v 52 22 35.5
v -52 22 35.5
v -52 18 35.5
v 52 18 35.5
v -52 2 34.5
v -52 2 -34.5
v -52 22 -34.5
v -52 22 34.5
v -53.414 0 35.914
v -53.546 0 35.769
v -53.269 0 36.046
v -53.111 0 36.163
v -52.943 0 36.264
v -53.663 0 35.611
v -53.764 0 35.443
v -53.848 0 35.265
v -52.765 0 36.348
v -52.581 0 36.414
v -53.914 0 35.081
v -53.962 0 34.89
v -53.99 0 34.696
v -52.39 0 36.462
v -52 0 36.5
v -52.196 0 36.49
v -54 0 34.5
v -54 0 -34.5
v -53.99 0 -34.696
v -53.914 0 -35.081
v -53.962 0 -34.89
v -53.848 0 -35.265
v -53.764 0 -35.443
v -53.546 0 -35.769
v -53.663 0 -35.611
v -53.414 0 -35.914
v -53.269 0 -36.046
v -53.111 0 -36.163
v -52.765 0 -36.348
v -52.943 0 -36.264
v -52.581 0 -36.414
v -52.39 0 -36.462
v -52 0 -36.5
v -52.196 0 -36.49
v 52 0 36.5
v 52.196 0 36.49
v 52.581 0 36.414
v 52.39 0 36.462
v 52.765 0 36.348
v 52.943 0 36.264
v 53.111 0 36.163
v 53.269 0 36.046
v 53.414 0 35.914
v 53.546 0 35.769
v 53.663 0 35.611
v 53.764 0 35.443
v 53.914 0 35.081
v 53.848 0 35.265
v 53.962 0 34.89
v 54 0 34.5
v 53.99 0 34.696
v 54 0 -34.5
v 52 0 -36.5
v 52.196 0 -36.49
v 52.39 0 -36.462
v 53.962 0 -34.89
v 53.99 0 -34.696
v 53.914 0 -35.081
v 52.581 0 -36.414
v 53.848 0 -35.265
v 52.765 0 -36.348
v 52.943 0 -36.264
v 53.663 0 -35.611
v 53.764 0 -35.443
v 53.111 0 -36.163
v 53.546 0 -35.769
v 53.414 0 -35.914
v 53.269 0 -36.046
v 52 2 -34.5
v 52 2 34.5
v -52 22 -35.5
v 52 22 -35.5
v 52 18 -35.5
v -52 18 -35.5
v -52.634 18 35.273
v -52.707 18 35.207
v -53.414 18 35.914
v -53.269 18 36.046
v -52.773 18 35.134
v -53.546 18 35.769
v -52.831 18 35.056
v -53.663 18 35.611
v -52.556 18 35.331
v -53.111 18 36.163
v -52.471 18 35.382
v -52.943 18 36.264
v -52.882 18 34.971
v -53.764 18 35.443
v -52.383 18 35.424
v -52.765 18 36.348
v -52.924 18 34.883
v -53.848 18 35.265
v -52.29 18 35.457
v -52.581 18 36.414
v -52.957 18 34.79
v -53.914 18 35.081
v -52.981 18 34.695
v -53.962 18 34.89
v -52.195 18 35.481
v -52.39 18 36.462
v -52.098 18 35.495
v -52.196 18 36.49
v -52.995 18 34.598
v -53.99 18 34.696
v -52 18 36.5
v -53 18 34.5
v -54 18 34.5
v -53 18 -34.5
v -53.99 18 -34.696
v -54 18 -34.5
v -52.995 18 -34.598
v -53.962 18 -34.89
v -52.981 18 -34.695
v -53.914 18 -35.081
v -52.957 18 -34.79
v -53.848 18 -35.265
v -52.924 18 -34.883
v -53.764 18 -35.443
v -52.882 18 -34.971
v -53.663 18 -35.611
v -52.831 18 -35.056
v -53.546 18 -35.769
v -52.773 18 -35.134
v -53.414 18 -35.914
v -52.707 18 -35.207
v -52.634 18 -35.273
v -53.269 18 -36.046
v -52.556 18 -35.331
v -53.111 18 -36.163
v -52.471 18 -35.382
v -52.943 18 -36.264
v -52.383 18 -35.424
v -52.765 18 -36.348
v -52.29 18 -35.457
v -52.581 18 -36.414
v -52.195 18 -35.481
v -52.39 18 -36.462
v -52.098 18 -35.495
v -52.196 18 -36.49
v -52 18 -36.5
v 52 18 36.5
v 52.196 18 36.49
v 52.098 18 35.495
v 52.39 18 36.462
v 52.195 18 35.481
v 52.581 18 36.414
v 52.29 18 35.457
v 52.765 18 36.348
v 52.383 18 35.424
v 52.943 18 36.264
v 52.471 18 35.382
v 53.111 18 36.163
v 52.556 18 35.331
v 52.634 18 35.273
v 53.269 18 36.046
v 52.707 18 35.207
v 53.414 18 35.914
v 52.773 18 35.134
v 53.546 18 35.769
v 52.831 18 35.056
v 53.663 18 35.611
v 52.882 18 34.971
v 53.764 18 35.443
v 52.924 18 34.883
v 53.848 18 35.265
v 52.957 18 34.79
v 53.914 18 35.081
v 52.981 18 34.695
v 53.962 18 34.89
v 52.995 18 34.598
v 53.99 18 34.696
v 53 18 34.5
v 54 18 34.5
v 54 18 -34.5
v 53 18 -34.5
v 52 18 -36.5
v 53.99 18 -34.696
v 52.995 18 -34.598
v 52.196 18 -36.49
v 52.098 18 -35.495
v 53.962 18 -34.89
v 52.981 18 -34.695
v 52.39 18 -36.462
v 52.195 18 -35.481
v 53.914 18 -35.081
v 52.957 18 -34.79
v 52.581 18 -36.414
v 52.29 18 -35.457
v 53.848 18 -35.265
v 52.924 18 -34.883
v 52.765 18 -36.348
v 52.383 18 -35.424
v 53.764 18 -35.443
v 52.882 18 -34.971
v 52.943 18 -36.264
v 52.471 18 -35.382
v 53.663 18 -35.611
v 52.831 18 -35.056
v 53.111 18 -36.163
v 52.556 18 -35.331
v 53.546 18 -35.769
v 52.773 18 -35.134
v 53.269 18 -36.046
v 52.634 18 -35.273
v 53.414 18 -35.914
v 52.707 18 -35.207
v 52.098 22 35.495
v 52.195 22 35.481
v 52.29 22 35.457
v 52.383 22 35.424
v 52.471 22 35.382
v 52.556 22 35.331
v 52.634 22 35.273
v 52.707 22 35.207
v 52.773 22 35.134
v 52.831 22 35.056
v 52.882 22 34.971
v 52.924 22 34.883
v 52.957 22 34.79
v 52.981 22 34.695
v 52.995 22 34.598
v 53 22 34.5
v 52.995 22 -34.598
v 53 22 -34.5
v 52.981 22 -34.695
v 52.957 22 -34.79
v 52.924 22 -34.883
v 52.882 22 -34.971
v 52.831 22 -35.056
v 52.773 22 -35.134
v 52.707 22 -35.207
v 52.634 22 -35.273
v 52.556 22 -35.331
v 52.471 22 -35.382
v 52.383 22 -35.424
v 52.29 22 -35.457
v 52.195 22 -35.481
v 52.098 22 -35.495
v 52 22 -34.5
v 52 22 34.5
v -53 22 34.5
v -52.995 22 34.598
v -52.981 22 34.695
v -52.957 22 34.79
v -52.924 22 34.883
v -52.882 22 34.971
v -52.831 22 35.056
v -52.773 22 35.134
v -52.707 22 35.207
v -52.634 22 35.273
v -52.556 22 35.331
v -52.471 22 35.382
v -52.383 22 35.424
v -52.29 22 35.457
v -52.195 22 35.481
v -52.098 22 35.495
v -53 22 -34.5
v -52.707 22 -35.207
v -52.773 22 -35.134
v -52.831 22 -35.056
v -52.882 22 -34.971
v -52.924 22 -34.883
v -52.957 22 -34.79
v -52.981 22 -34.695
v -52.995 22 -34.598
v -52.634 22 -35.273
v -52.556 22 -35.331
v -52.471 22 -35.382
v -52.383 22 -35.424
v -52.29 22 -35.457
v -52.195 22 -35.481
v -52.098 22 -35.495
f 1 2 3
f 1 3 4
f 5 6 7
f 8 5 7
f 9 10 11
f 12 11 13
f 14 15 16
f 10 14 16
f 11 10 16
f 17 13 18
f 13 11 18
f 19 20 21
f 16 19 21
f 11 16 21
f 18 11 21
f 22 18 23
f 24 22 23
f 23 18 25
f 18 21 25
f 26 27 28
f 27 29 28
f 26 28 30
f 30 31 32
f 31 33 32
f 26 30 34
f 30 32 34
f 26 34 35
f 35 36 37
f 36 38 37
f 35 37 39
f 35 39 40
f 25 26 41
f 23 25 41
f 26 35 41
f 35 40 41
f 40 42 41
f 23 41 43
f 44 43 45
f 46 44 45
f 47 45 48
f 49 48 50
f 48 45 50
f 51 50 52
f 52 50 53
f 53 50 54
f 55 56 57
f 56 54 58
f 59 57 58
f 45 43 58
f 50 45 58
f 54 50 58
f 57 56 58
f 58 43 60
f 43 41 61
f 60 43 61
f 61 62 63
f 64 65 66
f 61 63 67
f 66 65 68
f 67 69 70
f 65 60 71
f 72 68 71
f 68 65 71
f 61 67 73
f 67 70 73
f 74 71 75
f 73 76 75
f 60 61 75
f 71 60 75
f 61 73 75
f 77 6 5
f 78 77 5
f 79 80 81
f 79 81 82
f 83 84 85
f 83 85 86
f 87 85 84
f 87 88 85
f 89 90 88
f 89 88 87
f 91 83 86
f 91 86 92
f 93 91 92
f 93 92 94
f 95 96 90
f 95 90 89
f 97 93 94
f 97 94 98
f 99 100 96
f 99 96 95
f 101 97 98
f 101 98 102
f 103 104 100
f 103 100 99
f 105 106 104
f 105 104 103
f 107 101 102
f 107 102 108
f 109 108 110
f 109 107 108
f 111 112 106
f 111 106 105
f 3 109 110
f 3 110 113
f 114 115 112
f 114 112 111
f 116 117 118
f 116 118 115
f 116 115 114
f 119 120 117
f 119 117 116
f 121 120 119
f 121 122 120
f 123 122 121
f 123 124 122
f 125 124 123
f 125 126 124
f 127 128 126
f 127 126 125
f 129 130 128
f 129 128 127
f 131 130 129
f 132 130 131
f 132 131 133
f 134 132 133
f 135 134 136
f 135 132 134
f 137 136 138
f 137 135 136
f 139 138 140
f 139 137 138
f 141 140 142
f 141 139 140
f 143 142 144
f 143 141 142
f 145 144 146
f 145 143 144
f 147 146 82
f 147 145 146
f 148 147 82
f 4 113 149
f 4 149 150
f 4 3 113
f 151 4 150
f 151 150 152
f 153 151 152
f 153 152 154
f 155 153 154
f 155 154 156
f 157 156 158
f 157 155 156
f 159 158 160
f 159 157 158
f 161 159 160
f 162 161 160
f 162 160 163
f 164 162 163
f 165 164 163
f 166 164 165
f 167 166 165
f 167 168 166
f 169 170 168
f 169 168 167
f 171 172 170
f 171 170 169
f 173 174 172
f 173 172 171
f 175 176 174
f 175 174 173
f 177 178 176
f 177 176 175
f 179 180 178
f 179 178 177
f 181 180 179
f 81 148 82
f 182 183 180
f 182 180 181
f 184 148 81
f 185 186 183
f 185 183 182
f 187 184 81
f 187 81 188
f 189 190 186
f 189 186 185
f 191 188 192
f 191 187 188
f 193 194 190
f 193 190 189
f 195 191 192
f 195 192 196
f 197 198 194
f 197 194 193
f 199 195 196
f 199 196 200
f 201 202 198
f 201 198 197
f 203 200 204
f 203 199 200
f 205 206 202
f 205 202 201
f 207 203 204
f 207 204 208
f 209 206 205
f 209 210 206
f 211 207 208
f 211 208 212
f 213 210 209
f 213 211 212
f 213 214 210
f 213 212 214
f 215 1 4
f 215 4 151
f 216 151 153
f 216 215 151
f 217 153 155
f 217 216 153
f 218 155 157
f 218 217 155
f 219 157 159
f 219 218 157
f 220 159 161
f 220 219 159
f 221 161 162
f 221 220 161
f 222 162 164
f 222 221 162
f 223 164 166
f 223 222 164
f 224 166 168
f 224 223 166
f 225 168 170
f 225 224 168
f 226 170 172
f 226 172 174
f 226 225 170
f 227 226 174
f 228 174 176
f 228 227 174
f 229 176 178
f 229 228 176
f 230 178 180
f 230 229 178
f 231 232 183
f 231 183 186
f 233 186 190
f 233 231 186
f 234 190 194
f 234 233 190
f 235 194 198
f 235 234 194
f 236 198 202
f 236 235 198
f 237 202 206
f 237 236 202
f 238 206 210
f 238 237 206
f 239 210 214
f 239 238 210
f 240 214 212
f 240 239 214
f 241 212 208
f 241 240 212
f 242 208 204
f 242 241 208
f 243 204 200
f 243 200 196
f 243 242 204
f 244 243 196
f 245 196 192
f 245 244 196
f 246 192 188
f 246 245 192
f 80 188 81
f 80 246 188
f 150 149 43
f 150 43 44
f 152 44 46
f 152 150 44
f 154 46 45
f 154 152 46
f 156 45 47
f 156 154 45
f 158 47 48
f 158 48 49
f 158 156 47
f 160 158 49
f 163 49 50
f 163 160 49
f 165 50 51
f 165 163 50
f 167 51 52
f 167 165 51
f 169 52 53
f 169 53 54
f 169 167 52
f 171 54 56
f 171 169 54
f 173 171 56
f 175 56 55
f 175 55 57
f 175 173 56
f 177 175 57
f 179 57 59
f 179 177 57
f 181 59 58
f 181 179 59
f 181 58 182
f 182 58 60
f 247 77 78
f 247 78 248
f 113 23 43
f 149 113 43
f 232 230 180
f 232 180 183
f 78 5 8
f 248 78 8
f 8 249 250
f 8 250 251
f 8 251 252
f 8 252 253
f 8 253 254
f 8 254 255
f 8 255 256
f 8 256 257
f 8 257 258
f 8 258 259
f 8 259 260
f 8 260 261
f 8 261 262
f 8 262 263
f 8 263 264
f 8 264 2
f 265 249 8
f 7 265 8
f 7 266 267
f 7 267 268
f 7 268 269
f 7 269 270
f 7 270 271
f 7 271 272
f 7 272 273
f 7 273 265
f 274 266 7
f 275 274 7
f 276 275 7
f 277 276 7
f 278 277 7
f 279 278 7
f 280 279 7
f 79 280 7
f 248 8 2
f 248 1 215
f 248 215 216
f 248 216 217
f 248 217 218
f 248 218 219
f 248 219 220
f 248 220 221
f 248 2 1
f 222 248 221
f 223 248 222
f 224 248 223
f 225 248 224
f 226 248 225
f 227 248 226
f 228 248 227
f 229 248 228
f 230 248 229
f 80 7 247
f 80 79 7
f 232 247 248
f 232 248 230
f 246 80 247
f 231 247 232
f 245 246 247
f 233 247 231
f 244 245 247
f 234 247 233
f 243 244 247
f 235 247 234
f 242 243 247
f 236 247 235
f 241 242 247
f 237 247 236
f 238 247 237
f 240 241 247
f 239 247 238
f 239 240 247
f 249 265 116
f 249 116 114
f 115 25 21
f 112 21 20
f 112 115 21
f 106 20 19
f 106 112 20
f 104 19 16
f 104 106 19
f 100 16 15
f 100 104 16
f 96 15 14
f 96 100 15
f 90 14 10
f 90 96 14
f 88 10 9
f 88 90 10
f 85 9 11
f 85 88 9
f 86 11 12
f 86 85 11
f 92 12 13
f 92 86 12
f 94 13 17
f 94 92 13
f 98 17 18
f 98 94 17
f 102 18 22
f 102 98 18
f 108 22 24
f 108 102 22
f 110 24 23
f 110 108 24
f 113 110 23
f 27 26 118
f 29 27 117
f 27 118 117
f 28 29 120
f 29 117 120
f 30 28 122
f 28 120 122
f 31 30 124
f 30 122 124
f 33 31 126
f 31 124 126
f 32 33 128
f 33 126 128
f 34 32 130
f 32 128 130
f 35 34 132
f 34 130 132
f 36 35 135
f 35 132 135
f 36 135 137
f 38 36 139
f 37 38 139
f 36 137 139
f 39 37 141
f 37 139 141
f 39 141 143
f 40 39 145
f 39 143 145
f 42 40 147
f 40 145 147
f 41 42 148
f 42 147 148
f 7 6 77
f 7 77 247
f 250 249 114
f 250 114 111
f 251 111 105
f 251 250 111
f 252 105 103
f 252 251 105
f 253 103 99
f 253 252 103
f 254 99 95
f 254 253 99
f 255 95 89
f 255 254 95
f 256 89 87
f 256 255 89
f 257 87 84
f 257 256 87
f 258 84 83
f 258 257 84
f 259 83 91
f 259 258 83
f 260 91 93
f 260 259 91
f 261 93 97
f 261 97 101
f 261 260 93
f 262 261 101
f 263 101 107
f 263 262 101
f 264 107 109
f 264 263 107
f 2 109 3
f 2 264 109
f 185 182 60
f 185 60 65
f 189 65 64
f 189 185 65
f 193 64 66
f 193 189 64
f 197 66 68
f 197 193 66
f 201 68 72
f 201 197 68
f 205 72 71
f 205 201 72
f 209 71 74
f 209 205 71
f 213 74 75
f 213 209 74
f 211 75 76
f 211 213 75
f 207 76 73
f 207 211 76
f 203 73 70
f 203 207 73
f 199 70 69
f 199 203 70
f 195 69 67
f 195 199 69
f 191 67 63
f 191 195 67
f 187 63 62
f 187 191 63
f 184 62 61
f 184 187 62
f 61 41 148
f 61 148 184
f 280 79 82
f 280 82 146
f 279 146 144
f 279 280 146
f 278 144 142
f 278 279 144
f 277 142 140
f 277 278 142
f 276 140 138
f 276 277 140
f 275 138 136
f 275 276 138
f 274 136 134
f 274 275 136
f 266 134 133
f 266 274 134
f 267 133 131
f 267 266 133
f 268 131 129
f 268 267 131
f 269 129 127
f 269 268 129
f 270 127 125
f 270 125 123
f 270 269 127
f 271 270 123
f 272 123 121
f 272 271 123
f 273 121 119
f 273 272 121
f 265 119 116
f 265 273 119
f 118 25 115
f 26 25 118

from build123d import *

# Parameters (mm, degrees)
SKETCH1_W           = 108
SKETCH1_H           = 73
BOSS_EXTRUDE1_DEPTH = 22
FILLET1_R           = 2
SHELL1_START        = -52
SHELL1_OUTLINE_W    = 20
SHELL1_OUTLINE_H    = 69
SHELL1_DEPTH        = 104
SKETCH6_OUTSIDE_W   = 136.44
SKETCH6_OUTSIDE_H   = 101.44
CUT_EXTRUDE5_DEPTH  = 4


# Read off the part's stored shape, not the designer's step: Shell1
with BuildPart() as part:
    # Sketch1 → Boss-Extrude1 (new body)
    with BuildSketch(Plane(origin=(0, 0, 0), x_dir=(1, 0, 0), z_dir=(0, 1, 0))):
        Rectangle(SKETCH1_W, SKETCH1_H)
    extrude(amount=BOSS_EXTRUDE1_DEPTH)

    # Fillet1
    fillet1_edges = [part.edges().sort_by_distance(p)[0] for p in [
        (54, 11, 36.5),
        (-54, 11, 36.5),
        (-54, 11, -36.5),
        (54, 11, -36.5),
    ]]
    fillet(fillet1_edges, radius=FILLET1_R)

    # Shell1 outline → Shell1 (cut)
    with BuildSketch(Plane.YZ.offset(SHELL1_START)):
        with Locations((12, 0)):
            Rectangle(SHELL1_OUTLINE_W, SHELL1_OUTLINE_H)
    extrude(amount=SHELL1_DEPTH, mode=Mode.SUBTRACT)

    # Sketch6 outside → Cut-Extrude5 (cut)
    with BuildSketch(Plane(origin=(0, 22, 0), x_dir=(1, 0, 0), z_dir=(0, 1, 0))):
        Rectangle(SKETCH6_OUTSIDE_W, SKETCH6_OUTSIDE_H)
        with BuildLine():
            Line((53, -34.5), (53, 34.5))
            ThreePointArc((53, 34.5), (52.707106781, 35.207106781), (52, 35.5))
            Line((52, 35.5), (-52, 35.5))
            ThreePointArc((-52, 35.5), (-52.707106781, 35.207106781), (-53, 34.5))
            Line((-53, 34.5), (-53, -34.5))
            ThreePointArc((-53, -34.5), (-52.707106781, -35.207106781), (-52, -35.5))
            Line((-52, -35.5), (52, -35.5))
            ThreePointArc((52, -35.5), (52.707106781, -35.207106781), (53, -34.5))
        make_face(mode=Mode.SUBTRACT)
    extrude(amount=-CUT_EXTRUDE5_DEPTH, mode=Mode.SUBTRACT)


solid = part.part
